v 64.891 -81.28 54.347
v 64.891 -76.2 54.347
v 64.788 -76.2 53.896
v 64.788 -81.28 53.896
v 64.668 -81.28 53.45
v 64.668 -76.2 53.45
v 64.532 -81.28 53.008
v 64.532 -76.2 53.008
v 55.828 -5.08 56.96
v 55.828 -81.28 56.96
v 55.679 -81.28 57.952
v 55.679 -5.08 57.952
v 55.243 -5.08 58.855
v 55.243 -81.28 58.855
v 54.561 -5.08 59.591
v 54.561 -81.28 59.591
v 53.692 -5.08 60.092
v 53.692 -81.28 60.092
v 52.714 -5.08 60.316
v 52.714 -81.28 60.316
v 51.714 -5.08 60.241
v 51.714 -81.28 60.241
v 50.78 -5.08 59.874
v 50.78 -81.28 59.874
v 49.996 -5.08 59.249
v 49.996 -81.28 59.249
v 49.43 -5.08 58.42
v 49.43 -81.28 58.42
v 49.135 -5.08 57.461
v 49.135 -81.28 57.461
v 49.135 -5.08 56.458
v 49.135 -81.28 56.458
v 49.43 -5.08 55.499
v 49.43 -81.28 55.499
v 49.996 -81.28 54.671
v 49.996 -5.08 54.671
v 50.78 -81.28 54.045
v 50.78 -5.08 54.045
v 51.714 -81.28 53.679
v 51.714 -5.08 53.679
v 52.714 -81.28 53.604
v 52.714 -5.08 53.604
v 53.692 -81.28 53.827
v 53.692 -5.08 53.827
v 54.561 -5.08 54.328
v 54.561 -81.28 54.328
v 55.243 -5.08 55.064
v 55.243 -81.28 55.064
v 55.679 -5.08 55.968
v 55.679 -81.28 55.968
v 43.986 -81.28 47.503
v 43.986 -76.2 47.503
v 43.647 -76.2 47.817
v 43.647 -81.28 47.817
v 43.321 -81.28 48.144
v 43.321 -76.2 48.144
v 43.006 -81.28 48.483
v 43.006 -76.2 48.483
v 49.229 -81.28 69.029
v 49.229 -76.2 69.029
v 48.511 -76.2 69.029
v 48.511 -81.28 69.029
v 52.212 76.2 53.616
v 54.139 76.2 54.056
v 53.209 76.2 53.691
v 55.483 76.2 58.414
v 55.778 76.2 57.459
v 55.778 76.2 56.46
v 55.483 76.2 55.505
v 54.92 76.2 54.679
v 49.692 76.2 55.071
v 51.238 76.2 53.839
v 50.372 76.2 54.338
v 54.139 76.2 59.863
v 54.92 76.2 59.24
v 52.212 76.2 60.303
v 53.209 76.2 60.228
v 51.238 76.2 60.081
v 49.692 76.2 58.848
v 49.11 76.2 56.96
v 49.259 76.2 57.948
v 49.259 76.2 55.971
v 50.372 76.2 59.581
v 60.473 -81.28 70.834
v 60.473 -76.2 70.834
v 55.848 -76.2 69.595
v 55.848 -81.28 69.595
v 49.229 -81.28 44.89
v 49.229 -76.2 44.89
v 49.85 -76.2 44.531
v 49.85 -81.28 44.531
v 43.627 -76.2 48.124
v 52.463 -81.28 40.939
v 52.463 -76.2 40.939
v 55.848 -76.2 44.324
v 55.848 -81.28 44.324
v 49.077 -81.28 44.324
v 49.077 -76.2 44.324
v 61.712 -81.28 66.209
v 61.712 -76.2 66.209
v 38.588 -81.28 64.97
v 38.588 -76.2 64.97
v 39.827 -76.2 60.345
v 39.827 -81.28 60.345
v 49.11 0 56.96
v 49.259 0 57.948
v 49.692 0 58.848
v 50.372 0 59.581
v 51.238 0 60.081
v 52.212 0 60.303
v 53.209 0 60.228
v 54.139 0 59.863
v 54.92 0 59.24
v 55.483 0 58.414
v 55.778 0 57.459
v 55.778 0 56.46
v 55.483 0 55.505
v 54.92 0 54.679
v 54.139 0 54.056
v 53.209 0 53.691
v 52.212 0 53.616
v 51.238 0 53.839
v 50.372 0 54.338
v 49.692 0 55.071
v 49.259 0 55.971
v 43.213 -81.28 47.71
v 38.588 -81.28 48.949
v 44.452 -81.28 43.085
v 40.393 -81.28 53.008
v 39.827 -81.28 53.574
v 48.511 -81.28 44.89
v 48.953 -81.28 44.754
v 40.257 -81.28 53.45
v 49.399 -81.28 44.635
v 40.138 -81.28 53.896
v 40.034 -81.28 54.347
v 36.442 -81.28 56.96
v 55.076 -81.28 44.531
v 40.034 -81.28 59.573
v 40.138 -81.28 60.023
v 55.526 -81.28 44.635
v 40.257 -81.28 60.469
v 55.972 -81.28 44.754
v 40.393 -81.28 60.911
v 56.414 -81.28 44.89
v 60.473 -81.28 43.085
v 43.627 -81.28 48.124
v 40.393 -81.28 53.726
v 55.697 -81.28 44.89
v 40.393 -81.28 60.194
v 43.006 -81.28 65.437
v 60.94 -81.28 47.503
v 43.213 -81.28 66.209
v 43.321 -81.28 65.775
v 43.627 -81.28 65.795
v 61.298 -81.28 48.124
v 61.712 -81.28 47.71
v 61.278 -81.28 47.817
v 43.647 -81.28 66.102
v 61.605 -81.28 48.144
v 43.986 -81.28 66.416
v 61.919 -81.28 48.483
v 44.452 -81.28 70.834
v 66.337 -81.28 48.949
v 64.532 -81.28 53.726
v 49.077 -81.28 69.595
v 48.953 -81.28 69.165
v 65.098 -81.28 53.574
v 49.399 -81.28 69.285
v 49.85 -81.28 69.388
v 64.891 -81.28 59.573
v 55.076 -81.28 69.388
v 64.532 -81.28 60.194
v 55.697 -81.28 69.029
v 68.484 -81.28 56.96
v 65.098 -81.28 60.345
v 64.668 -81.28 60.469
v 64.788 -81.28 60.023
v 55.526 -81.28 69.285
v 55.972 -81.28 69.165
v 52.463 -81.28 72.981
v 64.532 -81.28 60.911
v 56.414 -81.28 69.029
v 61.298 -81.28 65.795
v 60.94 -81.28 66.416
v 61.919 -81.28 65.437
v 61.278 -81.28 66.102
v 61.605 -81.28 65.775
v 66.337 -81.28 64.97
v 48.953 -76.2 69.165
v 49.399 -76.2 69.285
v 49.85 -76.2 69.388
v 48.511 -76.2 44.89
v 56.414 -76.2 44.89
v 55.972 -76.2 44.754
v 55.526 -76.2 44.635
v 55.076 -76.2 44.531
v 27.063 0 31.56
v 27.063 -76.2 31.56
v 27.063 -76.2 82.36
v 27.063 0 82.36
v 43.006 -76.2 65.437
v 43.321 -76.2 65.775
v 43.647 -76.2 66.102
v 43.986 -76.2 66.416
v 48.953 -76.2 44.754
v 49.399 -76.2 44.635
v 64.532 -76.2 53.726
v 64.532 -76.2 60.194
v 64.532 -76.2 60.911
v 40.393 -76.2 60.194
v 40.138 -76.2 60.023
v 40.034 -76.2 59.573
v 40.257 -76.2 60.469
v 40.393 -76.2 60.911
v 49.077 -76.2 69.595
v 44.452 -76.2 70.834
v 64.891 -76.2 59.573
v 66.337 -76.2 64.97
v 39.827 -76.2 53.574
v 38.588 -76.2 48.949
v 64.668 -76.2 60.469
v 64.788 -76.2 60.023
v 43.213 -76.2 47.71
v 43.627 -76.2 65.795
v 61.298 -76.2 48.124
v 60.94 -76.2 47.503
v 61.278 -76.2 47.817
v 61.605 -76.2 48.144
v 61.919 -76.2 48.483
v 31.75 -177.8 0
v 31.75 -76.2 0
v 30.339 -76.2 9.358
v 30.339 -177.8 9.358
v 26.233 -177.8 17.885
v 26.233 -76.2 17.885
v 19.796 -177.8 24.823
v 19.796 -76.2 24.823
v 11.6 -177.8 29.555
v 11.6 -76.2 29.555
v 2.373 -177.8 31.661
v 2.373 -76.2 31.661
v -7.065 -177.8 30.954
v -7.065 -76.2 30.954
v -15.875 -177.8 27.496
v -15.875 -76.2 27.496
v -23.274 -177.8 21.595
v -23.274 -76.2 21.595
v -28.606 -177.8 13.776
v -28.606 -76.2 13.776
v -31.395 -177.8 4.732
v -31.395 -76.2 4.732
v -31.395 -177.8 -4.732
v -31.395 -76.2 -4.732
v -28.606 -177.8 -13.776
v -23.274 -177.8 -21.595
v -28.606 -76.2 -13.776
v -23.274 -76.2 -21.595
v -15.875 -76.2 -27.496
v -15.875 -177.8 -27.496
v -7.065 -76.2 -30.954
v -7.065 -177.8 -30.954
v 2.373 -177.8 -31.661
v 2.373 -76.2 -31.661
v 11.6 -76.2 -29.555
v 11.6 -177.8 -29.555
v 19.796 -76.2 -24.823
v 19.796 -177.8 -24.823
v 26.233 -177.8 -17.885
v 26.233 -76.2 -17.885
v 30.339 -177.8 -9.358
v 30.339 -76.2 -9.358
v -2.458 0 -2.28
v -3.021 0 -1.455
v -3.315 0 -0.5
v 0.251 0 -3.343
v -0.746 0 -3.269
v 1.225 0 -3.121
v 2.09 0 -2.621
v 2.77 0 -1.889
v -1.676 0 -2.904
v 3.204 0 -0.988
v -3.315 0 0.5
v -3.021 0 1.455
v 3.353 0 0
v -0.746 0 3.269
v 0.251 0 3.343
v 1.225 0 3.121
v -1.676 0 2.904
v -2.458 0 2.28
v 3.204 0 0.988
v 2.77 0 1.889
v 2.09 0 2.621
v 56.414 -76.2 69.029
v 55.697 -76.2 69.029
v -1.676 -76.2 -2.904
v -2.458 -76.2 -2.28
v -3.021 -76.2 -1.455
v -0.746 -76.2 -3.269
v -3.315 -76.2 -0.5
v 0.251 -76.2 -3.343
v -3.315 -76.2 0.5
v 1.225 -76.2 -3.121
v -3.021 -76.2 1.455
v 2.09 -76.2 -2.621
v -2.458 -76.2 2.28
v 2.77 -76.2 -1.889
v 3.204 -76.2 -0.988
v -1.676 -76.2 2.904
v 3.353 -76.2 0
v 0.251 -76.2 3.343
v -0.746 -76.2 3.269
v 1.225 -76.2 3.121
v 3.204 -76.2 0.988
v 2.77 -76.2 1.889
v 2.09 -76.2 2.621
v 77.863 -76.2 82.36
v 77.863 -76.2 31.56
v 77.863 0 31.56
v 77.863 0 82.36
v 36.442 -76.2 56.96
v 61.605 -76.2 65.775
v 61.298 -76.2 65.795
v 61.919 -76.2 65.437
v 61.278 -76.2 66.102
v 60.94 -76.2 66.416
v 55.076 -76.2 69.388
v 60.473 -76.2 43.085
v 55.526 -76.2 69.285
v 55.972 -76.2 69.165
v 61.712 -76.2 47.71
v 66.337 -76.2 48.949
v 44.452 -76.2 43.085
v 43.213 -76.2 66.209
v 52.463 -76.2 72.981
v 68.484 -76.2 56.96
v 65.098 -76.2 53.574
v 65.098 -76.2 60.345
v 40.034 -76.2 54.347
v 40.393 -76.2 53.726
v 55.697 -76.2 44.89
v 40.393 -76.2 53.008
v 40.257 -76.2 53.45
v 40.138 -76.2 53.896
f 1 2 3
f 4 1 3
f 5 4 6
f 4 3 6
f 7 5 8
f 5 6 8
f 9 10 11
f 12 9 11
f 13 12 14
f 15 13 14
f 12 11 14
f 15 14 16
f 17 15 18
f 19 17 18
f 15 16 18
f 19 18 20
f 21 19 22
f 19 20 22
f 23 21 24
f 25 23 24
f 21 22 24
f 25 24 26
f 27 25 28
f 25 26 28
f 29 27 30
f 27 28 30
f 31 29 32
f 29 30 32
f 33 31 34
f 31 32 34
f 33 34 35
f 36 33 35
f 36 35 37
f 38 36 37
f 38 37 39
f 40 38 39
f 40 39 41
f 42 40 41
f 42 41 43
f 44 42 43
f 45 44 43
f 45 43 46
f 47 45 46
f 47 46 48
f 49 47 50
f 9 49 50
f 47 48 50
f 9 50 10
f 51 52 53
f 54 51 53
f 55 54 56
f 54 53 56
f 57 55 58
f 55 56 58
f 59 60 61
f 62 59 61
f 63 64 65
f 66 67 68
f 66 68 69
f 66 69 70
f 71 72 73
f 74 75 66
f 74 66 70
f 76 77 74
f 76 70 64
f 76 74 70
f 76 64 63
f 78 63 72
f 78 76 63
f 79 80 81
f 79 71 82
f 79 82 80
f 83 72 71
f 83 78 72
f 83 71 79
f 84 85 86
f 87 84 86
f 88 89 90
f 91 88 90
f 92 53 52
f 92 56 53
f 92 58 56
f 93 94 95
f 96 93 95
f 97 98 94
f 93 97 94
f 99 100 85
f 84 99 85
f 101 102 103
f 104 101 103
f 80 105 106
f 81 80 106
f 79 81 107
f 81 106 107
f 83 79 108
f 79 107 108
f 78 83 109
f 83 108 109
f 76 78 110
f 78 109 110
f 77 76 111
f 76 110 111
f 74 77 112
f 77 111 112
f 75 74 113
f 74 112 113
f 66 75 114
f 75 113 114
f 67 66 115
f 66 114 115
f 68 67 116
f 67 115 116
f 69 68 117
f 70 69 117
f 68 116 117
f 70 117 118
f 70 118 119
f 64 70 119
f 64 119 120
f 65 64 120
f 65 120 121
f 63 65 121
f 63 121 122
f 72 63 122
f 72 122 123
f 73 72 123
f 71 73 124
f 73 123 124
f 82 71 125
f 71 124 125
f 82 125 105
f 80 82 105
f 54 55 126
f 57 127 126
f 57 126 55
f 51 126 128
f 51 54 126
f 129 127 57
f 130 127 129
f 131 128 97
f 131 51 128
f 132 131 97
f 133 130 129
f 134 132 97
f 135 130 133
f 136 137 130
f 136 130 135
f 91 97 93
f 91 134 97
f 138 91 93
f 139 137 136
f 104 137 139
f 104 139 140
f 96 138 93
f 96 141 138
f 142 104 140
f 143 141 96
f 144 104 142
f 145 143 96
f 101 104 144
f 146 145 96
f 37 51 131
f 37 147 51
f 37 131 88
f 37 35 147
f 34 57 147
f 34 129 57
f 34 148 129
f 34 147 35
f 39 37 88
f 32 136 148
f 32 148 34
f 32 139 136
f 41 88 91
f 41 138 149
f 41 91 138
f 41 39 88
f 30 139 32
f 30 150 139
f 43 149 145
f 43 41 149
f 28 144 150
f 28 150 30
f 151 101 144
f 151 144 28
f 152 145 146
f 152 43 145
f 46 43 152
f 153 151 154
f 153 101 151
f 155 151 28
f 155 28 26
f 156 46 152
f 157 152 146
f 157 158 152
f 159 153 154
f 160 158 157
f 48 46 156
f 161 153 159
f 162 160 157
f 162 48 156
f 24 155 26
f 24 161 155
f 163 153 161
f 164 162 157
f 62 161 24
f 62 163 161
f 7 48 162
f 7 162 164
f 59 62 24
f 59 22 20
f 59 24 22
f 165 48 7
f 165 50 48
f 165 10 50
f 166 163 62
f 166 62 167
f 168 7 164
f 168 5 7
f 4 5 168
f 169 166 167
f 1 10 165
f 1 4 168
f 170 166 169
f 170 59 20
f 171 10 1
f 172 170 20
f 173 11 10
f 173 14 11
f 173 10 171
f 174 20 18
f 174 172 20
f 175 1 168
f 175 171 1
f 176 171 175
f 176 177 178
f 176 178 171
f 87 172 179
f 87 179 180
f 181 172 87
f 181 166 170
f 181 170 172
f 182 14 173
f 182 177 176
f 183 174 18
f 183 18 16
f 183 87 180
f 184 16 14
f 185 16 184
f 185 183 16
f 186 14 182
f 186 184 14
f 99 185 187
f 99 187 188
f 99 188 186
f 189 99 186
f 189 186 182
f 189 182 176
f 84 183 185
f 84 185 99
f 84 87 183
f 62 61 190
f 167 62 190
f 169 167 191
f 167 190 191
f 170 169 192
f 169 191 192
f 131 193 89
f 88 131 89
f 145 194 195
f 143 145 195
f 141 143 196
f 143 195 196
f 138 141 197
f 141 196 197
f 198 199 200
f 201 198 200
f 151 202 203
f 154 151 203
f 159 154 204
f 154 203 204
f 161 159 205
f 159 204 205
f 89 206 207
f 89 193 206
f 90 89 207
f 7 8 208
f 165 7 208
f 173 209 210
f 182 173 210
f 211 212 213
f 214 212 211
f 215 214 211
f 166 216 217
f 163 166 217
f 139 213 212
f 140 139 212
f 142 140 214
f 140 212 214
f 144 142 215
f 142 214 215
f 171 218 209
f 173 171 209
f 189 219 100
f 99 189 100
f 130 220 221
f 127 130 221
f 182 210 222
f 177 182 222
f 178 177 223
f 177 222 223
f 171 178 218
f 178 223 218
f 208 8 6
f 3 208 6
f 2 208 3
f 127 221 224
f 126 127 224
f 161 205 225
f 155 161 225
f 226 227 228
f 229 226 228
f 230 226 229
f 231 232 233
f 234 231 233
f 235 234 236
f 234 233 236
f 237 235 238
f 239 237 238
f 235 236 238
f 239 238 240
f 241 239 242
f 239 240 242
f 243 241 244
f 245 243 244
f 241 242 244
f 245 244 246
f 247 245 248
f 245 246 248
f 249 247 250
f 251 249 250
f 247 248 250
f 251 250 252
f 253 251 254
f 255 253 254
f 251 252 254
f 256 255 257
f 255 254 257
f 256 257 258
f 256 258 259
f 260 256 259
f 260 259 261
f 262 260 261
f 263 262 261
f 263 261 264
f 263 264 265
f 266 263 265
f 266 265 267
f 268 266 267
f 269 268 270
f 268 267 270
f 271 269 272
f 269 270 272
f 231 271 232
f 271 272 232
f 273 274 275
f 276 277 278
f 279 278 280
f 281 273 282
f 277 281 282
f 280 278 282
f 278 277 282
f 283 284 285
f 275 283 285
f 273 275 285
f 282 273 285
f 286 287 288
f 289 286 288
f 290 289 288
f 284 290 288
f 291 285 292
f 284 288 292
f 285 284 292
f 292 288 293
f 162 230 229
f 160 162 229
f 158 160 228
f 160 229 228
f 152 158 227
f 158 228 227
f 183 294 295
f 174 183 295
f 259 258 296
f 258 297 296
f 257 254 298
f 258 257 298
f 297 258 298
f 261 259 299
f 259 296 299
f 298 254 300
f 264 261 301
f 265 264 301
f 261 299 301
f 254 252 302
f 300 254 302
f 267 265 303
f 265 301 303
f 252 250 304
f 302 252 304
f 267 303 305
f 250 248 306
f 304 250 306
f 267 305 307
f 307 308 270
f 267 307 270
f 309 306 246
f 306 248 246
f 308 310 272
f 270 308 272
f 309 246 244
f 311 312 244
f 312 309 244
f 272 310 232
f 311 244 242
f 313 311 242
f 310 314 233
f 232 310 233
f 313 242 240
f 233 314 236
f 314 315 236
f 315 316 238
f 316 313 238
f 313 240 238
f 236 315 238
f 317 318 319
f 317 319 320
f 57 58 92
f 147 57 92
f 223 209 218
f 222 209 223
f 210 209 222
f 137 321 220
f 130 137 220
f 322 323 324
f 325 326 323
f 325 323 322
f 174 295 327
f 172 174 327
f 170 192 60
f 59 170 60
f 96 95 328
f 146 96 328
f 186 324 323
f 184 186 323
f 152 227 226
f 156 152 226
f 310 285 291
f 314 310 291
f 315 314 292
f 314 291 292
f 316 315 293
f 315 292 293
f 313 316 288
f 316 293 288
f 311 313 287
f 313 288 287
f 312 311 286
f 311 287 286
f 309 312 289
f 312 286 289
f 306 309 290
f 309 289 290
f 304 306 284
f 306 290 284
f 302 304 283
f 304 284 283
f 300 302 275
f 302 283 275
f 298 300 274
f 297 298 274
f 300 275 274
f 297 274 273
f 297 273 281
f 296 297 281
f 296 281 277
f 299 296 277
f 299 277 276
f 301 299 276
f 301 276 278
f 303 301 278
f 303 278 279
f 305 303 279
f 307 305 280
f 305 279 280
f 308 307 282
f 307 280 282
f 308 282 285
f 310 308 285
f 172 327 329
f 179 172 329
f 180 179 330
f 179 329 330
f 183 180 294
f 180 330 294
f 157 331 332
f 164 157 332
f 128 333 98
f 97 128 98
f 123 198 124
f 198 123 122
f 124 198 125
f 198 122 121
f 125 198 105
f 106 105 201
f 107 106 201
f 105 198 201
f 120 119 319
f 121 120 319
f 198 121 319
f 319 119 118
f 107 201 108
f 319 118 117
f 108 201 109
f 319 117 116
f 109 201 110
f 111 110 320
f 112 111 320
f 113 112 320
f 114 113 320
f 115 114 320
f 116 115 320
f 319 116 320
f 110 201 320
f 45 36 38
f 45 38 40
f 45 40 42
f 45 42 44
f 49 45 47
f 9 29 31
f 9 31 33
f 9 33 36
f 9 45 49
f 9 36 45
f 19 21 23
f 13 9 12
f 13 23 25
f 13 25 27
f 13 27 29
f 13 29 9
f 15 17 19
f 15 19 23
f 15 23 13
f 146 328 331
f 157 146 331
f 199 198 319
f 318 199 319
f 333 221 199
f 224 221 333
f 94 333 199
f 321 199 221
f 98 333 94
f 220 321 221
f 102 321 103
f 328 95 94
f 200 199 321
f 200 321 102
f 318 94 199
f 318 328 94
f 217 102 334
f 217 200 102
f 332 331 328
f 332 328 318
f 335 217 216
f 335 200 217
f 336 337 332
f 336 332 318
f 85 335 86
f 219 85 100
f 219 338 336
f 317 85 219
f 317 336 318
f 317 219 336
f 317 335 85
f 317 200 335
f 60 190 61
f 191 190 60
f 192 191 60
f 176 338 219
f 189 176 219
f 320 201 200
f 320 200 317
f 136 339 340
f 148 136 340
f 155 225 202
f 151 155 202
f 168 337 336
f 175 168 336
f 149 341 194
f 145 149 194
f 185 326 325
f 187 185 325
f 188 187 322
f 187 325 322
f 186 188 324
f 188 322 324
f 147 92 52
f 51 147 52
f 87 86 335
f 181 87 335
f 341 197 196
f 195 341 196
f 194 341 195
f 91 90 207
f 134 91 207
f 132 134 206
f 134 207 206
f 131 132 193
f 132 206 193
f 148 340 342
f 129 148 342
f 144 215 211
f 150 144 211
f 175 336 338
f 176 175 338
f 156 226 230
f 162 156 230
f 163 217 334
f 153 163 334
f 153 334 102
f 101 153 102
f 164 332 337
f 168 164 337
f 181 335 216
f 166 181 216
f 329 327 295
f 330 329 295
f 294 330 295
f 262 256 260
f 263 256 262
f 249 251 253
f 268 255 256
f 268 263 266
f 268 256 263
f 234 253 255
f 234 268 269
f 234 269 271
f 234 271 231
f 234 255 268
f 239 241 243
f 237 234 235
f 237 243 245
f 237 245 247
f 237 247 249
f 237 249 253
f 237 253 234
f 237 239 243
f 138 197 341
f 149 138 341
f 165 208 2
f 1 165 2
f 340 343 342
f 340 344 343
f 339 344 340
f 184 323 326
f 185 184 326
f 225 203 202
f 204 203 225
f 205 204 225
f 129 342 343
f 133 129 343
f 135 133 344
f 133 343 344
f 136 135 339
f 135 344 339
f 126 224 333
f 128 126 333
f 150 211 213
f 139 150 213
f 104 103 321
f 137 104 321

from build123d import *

# Parameters (mm, degrees)
F0_R      = 3.3528
F1_DEPTH  = 76.2
F2_R      = 31.75
F3_DEPTH  = 101.6
F4_W      = 50.8
F4_H      = 50.8
F5_DEPTH  = 76.2
F6_R      = 3.3528
F7_DEPTH  = 76.2
F9_DEPTH  = 5.08
F10_R     = 3.3655
F11_DEPTH = 76.2


with BuildPart() as f1:
    # F0 (on Front) → F1 (new body)
    with BuildSketch(Plane.XZ):
        Circle(F0_R)
    extrude(amount=F1_DEPTH)

    # F2 (on face) → F3 (join)
    with BuildSketch(Plane.XZ.offset(76.2)):
        Circle(F2_R)
    extrude(amount=F3_DEPTH)


with BuildPart() as f5:
    # F4 (on Front) → F5 (new body)
    with BuildSketch(Plane.XZ):
        with Locations((52.4626414567, 56.9596275032)):
            Rectangle(F4_W, F4_H)
    extrude(amount=F5_DEPTH)

    # F6 (on face) → F7 (join)
    with BuildSketch(Plane(origin=(0, 0, 0), x_dir=(-1, 0, 0), z_dir=(0, 1, 0))):
        with Locations((-52.4626414567, 56.9596275032)):
            Circle(F6_R)
    extrude(amount=F7_DEPTH)

    # F8 (on face) → F9 (join)
    with BuildSketch(Plane.XZ.offset(76.2)):
        with BuildLine():
            ThreePointArc((64.5323194972, 60.9109401964), (64.7298994506, 60.246629376), (64.8909456019, 59.5725293527))
            Line((64.8909456019, 59.5725293527), (65.09799848, 60.3452612136))
            Line((65.09799848, 60.3452612136), (64.5323194972, 60.9109401964))
        make_face()
        with BuildLine():
            ThreePointArc((60.9396329086, 66.416403694), (61.4428975778, 65.9398836242), (61.9194176476, 65.436618955))
            Line((61.9194176476, 65.436618955), (61.7123647695, 66.209350816))
            Line((61.7123647695, 66.209350816), (60.9396329086, 66.416403694))
        make_face()
        with BuildLine():
            ThreePointArc((55.0755433063, 69.3879316483), (55.7496433295, 69.226885497), (56.41395415, 69.0293055436))
            Line((56.41395415, 69.0293055436), (55.8482751672, 69.5949845264))
            Line((55.8482751672, 69.5949845264), (55.0755433063, 69.3879316483))
        make_face()
        with BuildLine():
            Line((49.0770077463, 69.5949845264), (48.5113287635, 69.0293055436))
            ThreePointArc((48.5113287635, 69.0293055436), (49.1756395839, 69.226885497), (49.8497396072, 69.3879316483))
            Line((49.8497396072, 69.3879316483), (49.0770077463, 69.5949845264))
        make_face()
        with BuildLine():
            ThreePointArc((43.0058652658, 65.436618955), (43.4823853357, 65.9398836242), (43.9856500048, 66.416403694))
            Line((43.9856500048, 66.416403694), (43.2129181439, 66.209350816))
            Line((43.2129181439, 66.209350816), (43.0058652658, 65.436618955))
        make_face()
        with BuildLine():
            ThreePointArc((40.0343373116, 59.5725293527), (40.1953834629, 60.246629376), (40.3929634163, 60.9109401964))
            Line((40.3929634163, 60.9109401964), (39.8272844335, 60.3452612136))
            Line((39.8272844335, 60.3452612136), (40.0343373116, 59.5725293527))
        make_face()
        with BuildLine():
            Line((39.8272844335, 53.5739937927), (40.3929634163, 53.0083148099))
            ThreePointArc((40.3929634163, 53.0083148099), (40.1953834629, 53.6726256304), (40.0343373116, 54.3467256536))
            Line((40.0343373116, 54.3467256536), (39.8272844335, 53.5739937927))
        make_face()
        with BuildLine():
            Line((43.2129181439, 47.7099041904), (43.9856500048, 47.5028513123))
            ThreePointArc((43.9856500048, 47.5028513123), (43.4823853357, 47.9793713821), (43.0058652658, 48.4826360513))
            Line((43.0058652658, 48.4826360513), (43.2129181439, 47.7099041904))
        make_face()
        with BuildLine():
            Line((49.0770077463, 44.3242704799), (49.8497396072, 44.531323358))
            ThreePointArc((49.8497396072, 44.531323358), (49.1756395839, 44.6923695093), (48.5113287635, 44.8899494627))
            Line((48.5113287635, 44.8899494627), (49.0770077463, 44.3242704799))
        make_face()
        with BuildLine():
            Line((55.8482751672, 44.3242704799), (56.41395415, 44.8899494627))
            ThreePointArc((56.41395415, 44.8899494627), (55.7496433295, 44.6923695093), (55.0755433063, 44.531323358))
            Line((55.0755433063, 44.531323358), (55.8482751672, 44.3242704799))
        make_face()
        with BuildLine():
            Line((61.7123647695, 47.7099041904), (61.9194176476, 48.4826360513))
            ThreePointArc((61.9194176476, 48.4826360513), (61.4428975778, 47.9793713821), (60.9396329086, 47.5028513123))
            Line((60.9396329086, 47.5028513123), (61.7123647695, 47.7099041904))
        make_face()
        with BuildLine():
            Line((65.09799848, 53.5739937927), (64.8909456019, 54.3467256536))
            ThreePointArc((64.8909456019, 54.3467256536), (64.7298994506, 53.6726256304), (64.5323194972, 53.0083148099))
            Line((64.5323194972, 53.0083148099), (65.09799848, 53.5739937927))
        make_face()
        with BuildLine():
            ThreePointArc((61.9194176476, 65.436618955), (63.4611640848, 63.3096275032), (64.5323194972, 60.9109401964))
            Line((64.5323194972, 60.9109401964), (65.09799848, 60.3452612136))
            Line((65.09799848, 60.3452612136), (66.3372264259, 64.97012287))
            Line((66.3372264259, 64.97012287), (61.7123647695, 66.209350816))
            Line((61.7123647695, 66.209350816), (61.9194176476, 65.436618955))
        make_face()
        with BuildLine():
            ThreePointArc((56.41395415, 69.0293055436), (58.8126414567, 67.9581501312), (60.9396329086, 66.416403694))
            Line((60.9396329086, 66.416403694), (61.7123647695, 66.209350816))
            Line((61.7123647695, 66.209350816), (60.4731368236, 70.8342124723))
            Line((60.4731368236, 70.8342124723), (55.8482751672, 69.5949845264))
            Line((55.8482751672, 69.5949845264), (56.41395415, 69.0293055436))
        make_face()
        with BuildLine():
            ThreePointArc((49.8497396072, 69.3879316483), (52.4626414567, 69.6596275032), (55.0755433063, 69.3879316483))
            Line((55.0755433063, 69.3879316483), (55.8482751672, 69.5949845264))
            Line((55.8482751672, 69.5949845264), (52.4626414567, 72.9806182369))
            Line((52.4626414567, 72.9806182369), (49.0770077463, 69.5949845264))
            Line((49.0770077463, 69.5949845264), (49.8497396072, 69.3879316483))
        make_face()
        with BuildLine():
            ThreePointArc((40.3929634163, 60.9109401964), (41.4641188287, 63.3096275032), (43.0058652658, 65.436618955))
            Line((43.0058652658, 65.436618955), (43.2129181439, 66.209350816))
            Line((43.2129181439, 66.209350816), (38.5880564875, 64.97012287))
            Line((38.5880564875, 64.97012287), (39.8272844335, 60.3452612136))
            Line((39.8272844335, 60.3452612136), (40.3929634163, 60.9109401964))
        make_face()
        with BuildLine():
            ThreePointArc((40.0343373116, 54.3467256536), (39.7626414567, 56.9596275032), (40.0343373116, 59.5725293527))
            Line((40.0343373116, 59.5725293527), (39.8272844335, 60.3452612136))
            Line((39.8272844335, 60.3452612136), (36.441650723, 56.9596275032))
            Line((36.441650723, 56.9596275032), (39.8272844335, 53.5739937927))
            Line((39.8272844335, 53.5739937927), (40.0343373116, 54.3467256536))
        make_face()
        with BuildLine():
            Line((43.2129181439, 47.7099041904), (43.0058652658, 48.4826360513))
            ThreePointArc((43.0058652658, 48.4826360513), (41.4641188287, 50.6096275032), (40.3929634163, 53.0083148099))
            Line((40.3929634163, 53.0083148099), (39.8272844335, 53.5739937927))
            Line((39.8272844335, 53.5739937927), (38.5880564875, 48.9491321363))
            Line((38.5880564875, 48.9491321363), (43.2129181439, 47.7099041904))
        make_face()
        with BuildLine():
            Line((49.0770077463, 44.3242704799), (48.5113287635, 44.8899494627))
            ThreePointArc((48.5113287635, 44.8899494627), (46.1126414567, 45.9611048751), (43.9856500048, 47.5028513123))
            Line((43.9856500048, 47.5028513123), (43.2129181439, 47.7099041904))
            Line((43.2129181439, 47.7099041904), (44.4521460899, 43.085042534))
            Line((44.4521460899, 43.085042534), (49.0770077463, 44.3242704799))
        make_face()
        with BuildLine():
            Line((55.8482751672, 44.3242704799), (55.0755433063, 44.531323358))
            ThreePointArc((55.0755433063, 44.531323358), (52.4626414567, 44.2596275032), (49.8497396072, 44.531323358))
            Line((49.8497396072, 44.531323358), (49.0770077463, 44.3242704799))
            Line((49.0770077463, 44.3242704799), (52.4626414567, 40.9386367694))
            Line((52.4626414567, 40.9386367694), (55.8482751672, 44.3242704799))
        make_face()
        with BuildLine():
            Line((61.7123647695, 47.7099041904), (60.9396329086, 47.5028513123))
            ThreePointArc((60.9396329086, 47.5028513123), (58.8126414567, 45.9611048751), (56.41395415, 44.8899494627))
            Line((56.41395415, 44.8899494627), (55.8482751672, 44.3242704799))
            Line((55.8482751672, 44.3242704799), (60.4731368236, 43.085042534))
            Line((60.4731368236, 43.085042534), (61.7123647695, 47.7099041904))
        make_face()
        with BuildLine():
            Line((65.09799848, 53.5739937927), (64.5323194972, 53.0083148099))
            ThreePointArc((64.5323194972, 53.0083148099), (63.4611640848, 50.6096275032), (61.9194176476, 48.4826360513))
            Line((61.9194176476, 48.4826360513), (61.7123647695, 47.7099041904))
            Line((61.7123647695, 47.7099041904), (66.3372264259, 48.9491321363))
            Line((66.3372264259, 48.9491321363), (65.09799848, 53.5739937927))
        make_face()
        with BuildLine():
            ThreePointArc((64.8909456019, 59.5725293527), (65.0945348746, 58.2731223369), (65.1626414567, 56.9596275032))
            ThreePointArc((65.1626414567, 56.9596275032), (65.0945348746, 55.6461326694), (64.8909456019, 54.3467256536))
            Line((64.8909456019, 54.3467256536), (65.09799848, 53.5739937927))
            Line((65.09799848, 53.5739937927), (68.4836321904, 56.9596275032))
            Line((68.4836321904, 56.9596275032), (65.09799848, 60.3452612136))
            Line((65.09799848, 60.3452612136), (64.8909456019, 59.5725293527))
        make_face()
        Polygon((64.5323194972, 53.7255670193), (64.5323194972, 60.193687987), (61.2982590133, 65.7952450598), (55.6967019406, 69.0293055436), (49.2285809729, 69.0293055436), (43.6270239001, 65.7952450598), (40.3929634163, 60.193687987), (40.3929634163, 53.7255670193), (43.6270239001, 48.1240099466), (49.2285809729, 44.8899494627), (55.6967019406, 44.8899494627), (61.2982590133, 48.1240099466), align=None)
        with BuildLine():
            Line((43.6270239001, 65.7952450598), (49.2285809729, 69.0293055436))
            Line((49.2285809729, 69.0293055436), (48.5113287635, 69.0293055436))
            ThreePointArc((48.5113287635, 69.0293055436), (46.1126414567, 67.9581501312), (43.9856500048, 66.416403694))
            Line((43.9856500048, 66.416403694), (43.6270239001, 65.7952450598))
        make_face()
        with BuildLine():
            ThreePointArc((43.9856500048, 66.416403694), (46.1126414567, 67.9581501312), (48.5113287635, 69.0293055436))
            Line((48.5113287635, 69.0293055436), (49.0770077463, 69.5949845264))
            Line((49.0770077463, 69.5949845264), (44.4521460899, 70.8342124723))
            Line((44.4521460899, 70.8342124723), (43.2129181439, 66.209350816))
            Line((43.2129181439, 66.209350816), (43.9856500048, 66.416403694))
        make_face()
        with BuildLine():
            Line((49.2285809729, 69.0293055436), (55.6967019406, 69.0293055436))
            Line((55.6967019406, 69.0293055436), (55.0755433063, 69.3879316483))
            ThreePointArc((55.0755433063, 69.3879316483), (52.4626414567, 69.6596275032), (49.8497396072, 69.3879316483))
            Line((49.8497396072, 69.3879316483), (49.2285809729, 69.0293055436))
        make_face()
        with BuildLine():
            Line((55.6967019406, 69.0293055436), (61.2982590133, 65.7952450598))
            Line((61.2982590133, 65.7952450598), (60.9396329086, 66.416403694))
            ThreePointArc((60.9396329086, 66.416403694), (58.8126414567, 67.9581501312), (56.41395415, 69.0293055436))
            Line((56.41395415, 69.0293055436), (55.6967019406, 69.0293055436))
        make_face()
        with BuildLine():
            Line((64.5323194972, 60.193687987), (64.5323194972, 60.9109401964))
            ThreePointArc((64.5323194972, 60.9109401964), (63.4611640848, 63.3096275032), (61.9194176476, 65.436618955))
            Line((61.9194176476, 65.436618955), (61.2982590133, 65.7952450598))
            Line((61.2982590133, 65.7952450598), (64.5323194972, 60.193687987))
        make_face()
        with BuildLine():
            ThreePointArc((64.8909456019, 54.3467256536), (65.0945348746, 55.6461326694), (65.1626414567, 56.9596275032))
            ThreePointArc((65.1626414567, 56.9596275032), (65.0945348746, 58.2731223369), (64.8909456019, 59.5725293527))
            Line((64.8909456019, 59.5725293527), (64.5323194972, 60.193687987))
            Line((64.5323194972, 60.193687987), (64.5323194972, 53.7255670193))
            Line((64.5323194972, 53.7255670193), (64.8909456019, 54.3467256536))
        make_face()
        with BuildLine():
            ThreePointArc((61.9194176476, 48.4826360513), (63.4611640848, 50.6096275032), (64.5323194972, 53.0083148099))
            Line((64.5323194972, 53.0083148099), (64.5323194972, 53.7255670193))
            Line((64.5323194972, 53.7255670193), (61.2982590133, 48.1240099466))
            Line((61.2982590133, 48.1240099466), (61.9194176476, 48.4826360513))
        make_face()
        with BuildLine():
            Line((60.9396329086, 47.5028513123), (61.2982590133, 48.1240099466))
            Line((61.2982590133, 48.1240099466), (55.6967019406, 44.8899494627))
            Line((55.6967019406, 44.8899494627), (56.41395415, 44.8899494627))
            ThreePointArc((56.41395415, 44.8899494627), (58.8126414567, 45.9611048751), (60.9396329086, 47.5028513123))
        make_face()
        with BuildLine():
            Line((55.0755433063, 44.531323358), (55.6967019406, 44.8899494627))
            Line((55.6967019406, 44.8899494627), (49.2285809729, 44.8899494627))
            Line((49.2285809729, 44.8899494627), (49.8497396072, 44.531323358))
            ThreePointArc((49.8497396072, 44.531323358), (52.4626414567, 44.2596275032), (55.0755433063, 44.531323358))
        make_face()
        with BuildLine():
            Line((48.5113287635, 44.8899494627), (49.2285809729, 44.8899494627))
            Line((49.2285809729, 44.8899494627), (43.6270239001, 48.1240099466))
            Line((43.6270239001, 48.1240099466), (43.9856500048, 47.5028513123))
            ThreePointArc((43.9856500048, 47.5028513123), (46.1126414567, 45.9611048751), (48.5113287635, 44.8899494627))
        make_face()
        with BuildLine():
            Line((43.0058652658, 48.4826360513), (43.6270239001, 48.1240099466))
            Line((43.6270239001, 48.1240099466), (40.3929634163, 53.7255670193))
            Line((40.3929634163, 53.7255670193), (40.3929634163, 53.0083148099))
            ThreePointArc((40.3929634163, 53.0083148099), (41.4641188287, 50.6096275032), (43.0058652658, 48.4826360513))
        make_face()
        with BuildLine():
            Line((40.3929634163, 53.7255670193), (40.3929634163, 60.193687987))
            Line((40.3929634163, 60.193687987), (40.0343373116, 59.5725293527))
            ThreePointArc((40.0343373116, 59.5725293527), (39.7626414567, 56.9596275032), (40.0343373116, 54.3467256536))
            Line((40.0343373116, 54.3467256536), (40.3929634163, 53.7255670193))
        make_face()
        with BuildLine():
            Line((40.3929634163, 60.193687987), (43.6270239001, 65.7952450598))
            Line((43.6270239001, 65.7952450598), (43.0058652658, 65.436618955))
            ThreePointArc((43.0058652658, 65.436618955), (41.4641188287, 63.3096275032), (40.3929634163, 60.9109401964))
            Line((40.3929634163, 60.9109401964), (40.3929634163, 60.193687987))
        make_face()
    extrude(amount=F9_DEPTH)

    # F10 (on face) → F11 (cut)
    with BuildSketch(Plane.XZ.offset(81.28)):
        with Locations((52.4626414567, 56.9596275032)):
            Circle(F10_R)
    extrude(amount=-F11_DEPTH, mode=Mode.SUBTRACT)


solid = Compound([f1.part, f5.part])
